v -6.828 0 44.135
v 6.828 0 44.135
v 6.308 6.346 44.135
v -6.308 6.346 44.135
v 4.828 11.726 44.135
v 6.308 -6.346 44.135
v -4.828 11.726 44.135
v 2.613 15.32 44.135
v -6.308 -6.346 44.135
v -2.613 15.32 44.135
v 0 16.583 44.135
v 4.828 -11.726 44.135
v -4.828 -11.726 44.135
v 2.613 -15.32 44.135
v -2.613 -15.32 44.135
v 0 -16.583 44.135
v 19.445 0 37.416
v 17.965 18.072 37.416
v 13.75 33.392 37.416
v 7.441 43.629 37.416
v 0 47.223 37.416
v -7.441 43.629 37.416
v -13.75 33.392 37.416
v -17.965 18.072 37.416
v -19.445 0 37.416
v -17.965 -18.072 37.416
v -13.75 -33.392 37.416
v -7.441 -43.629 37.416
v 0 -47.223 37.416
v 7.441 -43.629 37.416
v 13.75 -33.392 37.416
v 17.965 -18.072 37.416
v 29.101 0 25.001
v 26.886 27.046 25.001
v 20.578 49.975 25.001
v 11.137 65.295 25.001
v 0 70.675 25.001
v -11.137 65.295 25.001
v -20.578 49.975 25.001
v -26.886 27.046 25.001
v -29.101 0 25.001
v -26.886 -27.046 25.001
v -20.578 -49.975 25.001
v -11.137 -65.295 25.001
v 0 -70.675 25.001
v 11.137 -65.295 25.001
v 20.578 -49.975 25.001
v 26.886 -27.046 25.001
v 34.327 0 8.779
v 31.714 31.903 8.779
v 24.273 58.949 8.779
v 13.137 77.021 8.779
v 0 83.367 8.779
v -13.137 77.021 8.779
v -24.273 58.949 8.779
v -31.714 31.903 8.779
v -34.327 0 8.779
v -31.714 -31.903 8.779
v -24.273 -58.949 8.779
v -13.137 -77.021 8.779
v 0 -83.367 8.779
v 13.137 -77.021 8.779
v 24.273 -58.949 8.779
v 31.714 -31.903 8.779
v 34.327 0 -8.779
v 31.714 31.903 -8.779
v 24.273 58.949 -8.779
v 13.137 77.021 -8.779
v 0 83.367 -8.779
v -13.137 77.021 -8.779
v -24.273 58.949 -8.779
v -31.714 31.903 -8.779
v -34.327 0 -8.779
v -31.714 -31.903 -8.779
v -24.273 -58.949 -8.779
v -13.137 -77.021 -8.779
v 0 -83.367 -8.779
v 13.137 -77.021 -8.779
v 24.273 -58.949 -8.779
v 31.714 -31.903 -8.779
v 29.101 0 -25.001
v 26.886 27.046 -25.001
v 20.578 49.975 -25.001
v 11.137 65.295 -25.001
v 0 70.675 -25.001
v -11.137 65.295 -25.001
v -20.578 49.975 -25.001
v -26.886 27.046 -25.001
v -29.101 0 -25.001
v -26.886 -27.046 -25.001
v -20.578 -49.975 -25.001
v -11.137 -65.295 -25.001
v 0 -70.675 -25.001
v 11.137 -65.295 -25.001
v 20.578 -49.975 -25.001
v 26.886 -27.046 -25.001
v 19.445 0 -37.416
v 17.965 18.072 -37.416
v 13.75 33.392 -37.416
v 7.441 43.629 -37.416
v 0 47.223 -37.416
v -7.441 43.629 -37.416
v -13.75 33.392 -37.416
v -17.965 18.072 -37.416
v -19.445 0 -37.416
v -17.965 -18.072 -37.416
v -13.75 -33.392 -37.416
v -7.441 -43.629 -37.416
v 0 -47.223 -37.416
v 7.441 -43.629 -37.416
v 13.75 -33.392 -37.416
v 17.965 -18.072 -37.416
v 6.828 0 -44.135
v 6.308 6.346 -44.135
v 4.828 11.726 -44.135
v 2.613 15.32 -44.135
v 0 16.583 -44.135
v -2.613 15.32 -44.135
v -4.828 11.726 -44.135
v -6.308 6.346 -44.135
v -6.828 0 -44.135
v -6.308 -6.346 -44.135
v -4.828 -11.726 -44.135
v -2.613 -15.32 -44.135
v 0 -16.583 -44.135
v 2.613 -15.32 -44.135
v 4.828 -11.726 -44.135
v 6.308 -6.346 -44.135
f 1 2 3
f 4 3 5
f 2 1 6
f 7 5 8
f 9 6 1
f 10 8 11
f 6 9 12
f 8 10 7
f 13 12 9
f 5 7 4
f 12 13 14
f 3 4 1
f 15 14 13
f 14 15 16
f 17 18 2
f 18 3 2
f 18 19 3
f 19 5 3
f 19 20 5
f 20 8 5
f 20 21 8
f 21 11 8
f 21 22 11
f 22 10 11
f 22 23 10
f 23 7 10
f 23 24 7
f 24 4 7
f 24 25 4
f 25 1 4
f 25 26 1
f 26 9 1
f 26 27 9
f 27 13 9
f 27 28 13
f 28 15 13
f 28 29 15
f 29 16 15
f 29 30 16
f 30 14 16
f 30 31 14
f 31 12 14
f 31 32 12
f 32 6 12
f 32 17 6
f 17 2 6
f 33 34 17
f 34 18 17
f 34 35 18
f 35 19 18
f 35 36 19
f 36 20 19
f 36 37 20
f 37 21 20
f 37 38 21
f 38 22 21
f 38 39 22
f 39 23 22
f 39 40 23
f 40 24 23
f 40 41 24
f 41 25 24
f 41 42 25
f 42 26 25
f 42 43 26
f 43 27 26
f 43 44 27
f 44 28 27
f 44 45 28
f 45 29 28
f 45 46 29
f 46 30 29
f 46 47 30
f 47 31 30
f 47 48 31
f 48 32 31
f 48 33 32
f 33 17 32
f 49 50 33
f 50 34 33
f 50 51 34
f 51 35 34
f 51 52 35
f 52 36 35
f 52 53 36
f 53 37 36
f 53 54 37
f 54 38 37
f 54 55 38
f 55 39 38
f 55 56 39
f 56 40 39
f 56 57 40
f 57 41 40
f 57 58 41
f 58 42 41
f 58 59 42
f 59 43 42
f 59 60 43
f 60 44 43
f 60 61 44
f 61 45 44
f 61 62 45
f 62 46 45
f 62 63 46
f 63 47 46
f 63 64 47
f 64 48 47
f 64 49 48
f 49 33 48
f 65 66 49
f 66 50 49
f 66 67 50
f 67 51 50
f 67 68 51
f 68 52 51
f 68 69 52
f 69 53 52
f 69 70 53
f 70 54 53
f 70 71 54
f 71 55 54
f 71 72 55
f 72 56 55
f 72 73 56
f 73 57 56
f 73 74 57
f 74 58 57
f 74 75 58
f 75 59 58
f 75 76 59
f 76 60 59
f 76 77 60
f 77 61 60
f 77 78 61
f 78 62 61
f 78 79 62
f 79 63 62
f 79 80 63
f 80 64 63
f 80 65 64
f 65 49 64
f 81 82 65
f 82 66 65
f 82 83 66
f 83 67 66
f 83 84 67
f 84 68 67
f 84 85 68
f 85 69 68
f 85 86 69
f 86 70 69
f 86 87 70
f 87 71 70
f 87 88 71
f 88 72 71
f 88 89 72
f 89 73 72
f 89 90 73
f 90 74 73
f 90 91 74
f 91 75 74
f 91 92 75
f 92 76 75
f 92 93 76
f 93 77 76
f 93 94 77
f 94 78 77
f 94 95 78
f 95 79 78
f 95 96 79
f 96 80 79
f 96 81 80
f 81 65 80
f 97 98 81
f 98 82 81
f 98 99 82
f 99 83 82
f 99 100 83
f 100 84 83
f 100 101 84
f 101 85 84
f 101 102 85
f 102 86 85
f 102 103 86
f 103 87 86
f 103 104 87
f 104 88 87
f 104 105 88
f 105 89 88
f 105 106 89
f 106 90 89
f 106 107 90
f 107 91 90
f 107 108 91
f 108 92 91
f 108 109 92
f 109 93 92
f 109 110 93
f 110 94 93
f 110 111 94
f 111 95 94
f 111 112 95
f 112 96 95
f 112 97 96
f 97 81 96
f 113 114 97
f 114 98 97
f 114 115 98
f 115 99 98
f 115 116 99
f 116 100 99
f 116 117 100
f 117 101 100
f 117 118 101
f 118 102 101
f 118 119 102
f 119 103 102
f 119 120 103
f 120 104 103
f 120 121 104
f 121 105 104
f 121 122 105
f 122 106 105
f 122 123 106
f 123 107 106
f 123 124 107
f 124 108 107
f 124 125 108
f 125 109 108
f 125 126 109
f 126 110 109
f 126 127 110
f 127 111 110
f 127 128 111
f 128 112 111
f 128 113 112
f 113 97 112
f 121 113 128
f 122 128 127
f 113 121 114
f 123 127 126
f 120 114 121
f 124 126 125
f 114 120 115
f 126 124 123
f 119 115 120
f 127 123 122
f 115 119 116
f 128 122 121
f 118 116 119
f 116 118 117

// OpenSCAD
// Generated by SolidPython 1.0.1 on 2020-07-29 00:46:48


scale(v = [7, 17, 9]) {
	sphere(r = 5);
}
/***********************************************
*********      SolidPython code:      **********
************************************************
 
# import packages: SolidPython
from solid import *
from solid.utils import *
from itertools import chain, combinations, permutations


class Resize:

    def __init__(self, scad_file):
        self.scad_file = scad_file
        #self.scad_file = import_scad(scad_file)
        # cone/cylinder param:
        self.r1 = 0
        self.r2 = 0
        self.h = 0
        # rectangular prism param:
        self.w = 0
        self.l = 0
        # ellipse param:
        self.r = 0

    # import OpenScad code (file name corresponds to shape)


    # classify shape + parameters
    def assign(self, param1, param2, param3):
        if self.scad_file == 'cone.scad':
            self.r1 = param1
            self.r2 = param2
            self.h = param3
        elif self.scad_file == 'cylinder.scad':
            self.r1 = param1
            self.r2 = param2
            self.h = param3
        elif self.scad_file == 'rectangularPrism.scad':
            self.h = param1
            self.l = param2
            self.w = param3
        else:
            self.r = param1
            self.h = param2

    # resize parameters
    def iterate(self):
        x = range(3, 20, 2)
        i = 1
        if self.scad_file == 'cone.scad':
            tempList = list(permutations(x, 2))
            for temp in tempList:
                param1 = temp[0]
                param2 = temp[1]
                filepath = 'produced_scad_files/' + 'cone' + str(param1) + '_' + str(param2) + '_' + '.scad'
                scad_render_to_file(cylinder(h=param1, r1=param2, r2=0), filepath)

        elif self.scad_file == 'cylinder.scad':
            tempList = list(permutations(x, 3))
            for temp in tempList:
                param1 = temp[0]
                param2 = temp[1]
                filepath = 'produced_scad_files/' + 'cylinder' + str(param1) + '_' + str(param2) + '_' + '.scad'
                scad_render_to_file(cylinder(h=param1, r1=param2, r2=param2), filepath)

        elif self.scad_file == 'rectangularPrism.scad':
            tempList = list(permutations(x, 3))
            for temp in tempList:
                param1 = temp[0]
                param2 = temp[1]
                param3 = temp[2]
                filepath = 'produced_scad_files/' + 'rectangularPrism' + str(param1) + '_' + str(param2) + '_' + str(
                    param3) + '.scad'
                scad_render_to_file(cube(size=(param1, param2, param3)), filepath)

        elif self.scad_file == 'ellipse.scad':
            tempList = list(permutations(x, 4))
            for temp in tempList:
                param1 = temp[0]
                param2 = temp[1]
                param3 = temp[2]
                param4 = temp[3]
                filepath = 'produced_scad_files/' + 'ellipse' + str(param1) + '_' + str(param2) + '_' + str(param3) + '_' + str(param4) + '.scad'
                scad_render_to_file(scale([param1, param2, param3])(sphere(r=param4)), filepath)

    def render_to_scadfile(self):
        scad_render_to_file(scad, 'example.scad') 
 
************************************************/
